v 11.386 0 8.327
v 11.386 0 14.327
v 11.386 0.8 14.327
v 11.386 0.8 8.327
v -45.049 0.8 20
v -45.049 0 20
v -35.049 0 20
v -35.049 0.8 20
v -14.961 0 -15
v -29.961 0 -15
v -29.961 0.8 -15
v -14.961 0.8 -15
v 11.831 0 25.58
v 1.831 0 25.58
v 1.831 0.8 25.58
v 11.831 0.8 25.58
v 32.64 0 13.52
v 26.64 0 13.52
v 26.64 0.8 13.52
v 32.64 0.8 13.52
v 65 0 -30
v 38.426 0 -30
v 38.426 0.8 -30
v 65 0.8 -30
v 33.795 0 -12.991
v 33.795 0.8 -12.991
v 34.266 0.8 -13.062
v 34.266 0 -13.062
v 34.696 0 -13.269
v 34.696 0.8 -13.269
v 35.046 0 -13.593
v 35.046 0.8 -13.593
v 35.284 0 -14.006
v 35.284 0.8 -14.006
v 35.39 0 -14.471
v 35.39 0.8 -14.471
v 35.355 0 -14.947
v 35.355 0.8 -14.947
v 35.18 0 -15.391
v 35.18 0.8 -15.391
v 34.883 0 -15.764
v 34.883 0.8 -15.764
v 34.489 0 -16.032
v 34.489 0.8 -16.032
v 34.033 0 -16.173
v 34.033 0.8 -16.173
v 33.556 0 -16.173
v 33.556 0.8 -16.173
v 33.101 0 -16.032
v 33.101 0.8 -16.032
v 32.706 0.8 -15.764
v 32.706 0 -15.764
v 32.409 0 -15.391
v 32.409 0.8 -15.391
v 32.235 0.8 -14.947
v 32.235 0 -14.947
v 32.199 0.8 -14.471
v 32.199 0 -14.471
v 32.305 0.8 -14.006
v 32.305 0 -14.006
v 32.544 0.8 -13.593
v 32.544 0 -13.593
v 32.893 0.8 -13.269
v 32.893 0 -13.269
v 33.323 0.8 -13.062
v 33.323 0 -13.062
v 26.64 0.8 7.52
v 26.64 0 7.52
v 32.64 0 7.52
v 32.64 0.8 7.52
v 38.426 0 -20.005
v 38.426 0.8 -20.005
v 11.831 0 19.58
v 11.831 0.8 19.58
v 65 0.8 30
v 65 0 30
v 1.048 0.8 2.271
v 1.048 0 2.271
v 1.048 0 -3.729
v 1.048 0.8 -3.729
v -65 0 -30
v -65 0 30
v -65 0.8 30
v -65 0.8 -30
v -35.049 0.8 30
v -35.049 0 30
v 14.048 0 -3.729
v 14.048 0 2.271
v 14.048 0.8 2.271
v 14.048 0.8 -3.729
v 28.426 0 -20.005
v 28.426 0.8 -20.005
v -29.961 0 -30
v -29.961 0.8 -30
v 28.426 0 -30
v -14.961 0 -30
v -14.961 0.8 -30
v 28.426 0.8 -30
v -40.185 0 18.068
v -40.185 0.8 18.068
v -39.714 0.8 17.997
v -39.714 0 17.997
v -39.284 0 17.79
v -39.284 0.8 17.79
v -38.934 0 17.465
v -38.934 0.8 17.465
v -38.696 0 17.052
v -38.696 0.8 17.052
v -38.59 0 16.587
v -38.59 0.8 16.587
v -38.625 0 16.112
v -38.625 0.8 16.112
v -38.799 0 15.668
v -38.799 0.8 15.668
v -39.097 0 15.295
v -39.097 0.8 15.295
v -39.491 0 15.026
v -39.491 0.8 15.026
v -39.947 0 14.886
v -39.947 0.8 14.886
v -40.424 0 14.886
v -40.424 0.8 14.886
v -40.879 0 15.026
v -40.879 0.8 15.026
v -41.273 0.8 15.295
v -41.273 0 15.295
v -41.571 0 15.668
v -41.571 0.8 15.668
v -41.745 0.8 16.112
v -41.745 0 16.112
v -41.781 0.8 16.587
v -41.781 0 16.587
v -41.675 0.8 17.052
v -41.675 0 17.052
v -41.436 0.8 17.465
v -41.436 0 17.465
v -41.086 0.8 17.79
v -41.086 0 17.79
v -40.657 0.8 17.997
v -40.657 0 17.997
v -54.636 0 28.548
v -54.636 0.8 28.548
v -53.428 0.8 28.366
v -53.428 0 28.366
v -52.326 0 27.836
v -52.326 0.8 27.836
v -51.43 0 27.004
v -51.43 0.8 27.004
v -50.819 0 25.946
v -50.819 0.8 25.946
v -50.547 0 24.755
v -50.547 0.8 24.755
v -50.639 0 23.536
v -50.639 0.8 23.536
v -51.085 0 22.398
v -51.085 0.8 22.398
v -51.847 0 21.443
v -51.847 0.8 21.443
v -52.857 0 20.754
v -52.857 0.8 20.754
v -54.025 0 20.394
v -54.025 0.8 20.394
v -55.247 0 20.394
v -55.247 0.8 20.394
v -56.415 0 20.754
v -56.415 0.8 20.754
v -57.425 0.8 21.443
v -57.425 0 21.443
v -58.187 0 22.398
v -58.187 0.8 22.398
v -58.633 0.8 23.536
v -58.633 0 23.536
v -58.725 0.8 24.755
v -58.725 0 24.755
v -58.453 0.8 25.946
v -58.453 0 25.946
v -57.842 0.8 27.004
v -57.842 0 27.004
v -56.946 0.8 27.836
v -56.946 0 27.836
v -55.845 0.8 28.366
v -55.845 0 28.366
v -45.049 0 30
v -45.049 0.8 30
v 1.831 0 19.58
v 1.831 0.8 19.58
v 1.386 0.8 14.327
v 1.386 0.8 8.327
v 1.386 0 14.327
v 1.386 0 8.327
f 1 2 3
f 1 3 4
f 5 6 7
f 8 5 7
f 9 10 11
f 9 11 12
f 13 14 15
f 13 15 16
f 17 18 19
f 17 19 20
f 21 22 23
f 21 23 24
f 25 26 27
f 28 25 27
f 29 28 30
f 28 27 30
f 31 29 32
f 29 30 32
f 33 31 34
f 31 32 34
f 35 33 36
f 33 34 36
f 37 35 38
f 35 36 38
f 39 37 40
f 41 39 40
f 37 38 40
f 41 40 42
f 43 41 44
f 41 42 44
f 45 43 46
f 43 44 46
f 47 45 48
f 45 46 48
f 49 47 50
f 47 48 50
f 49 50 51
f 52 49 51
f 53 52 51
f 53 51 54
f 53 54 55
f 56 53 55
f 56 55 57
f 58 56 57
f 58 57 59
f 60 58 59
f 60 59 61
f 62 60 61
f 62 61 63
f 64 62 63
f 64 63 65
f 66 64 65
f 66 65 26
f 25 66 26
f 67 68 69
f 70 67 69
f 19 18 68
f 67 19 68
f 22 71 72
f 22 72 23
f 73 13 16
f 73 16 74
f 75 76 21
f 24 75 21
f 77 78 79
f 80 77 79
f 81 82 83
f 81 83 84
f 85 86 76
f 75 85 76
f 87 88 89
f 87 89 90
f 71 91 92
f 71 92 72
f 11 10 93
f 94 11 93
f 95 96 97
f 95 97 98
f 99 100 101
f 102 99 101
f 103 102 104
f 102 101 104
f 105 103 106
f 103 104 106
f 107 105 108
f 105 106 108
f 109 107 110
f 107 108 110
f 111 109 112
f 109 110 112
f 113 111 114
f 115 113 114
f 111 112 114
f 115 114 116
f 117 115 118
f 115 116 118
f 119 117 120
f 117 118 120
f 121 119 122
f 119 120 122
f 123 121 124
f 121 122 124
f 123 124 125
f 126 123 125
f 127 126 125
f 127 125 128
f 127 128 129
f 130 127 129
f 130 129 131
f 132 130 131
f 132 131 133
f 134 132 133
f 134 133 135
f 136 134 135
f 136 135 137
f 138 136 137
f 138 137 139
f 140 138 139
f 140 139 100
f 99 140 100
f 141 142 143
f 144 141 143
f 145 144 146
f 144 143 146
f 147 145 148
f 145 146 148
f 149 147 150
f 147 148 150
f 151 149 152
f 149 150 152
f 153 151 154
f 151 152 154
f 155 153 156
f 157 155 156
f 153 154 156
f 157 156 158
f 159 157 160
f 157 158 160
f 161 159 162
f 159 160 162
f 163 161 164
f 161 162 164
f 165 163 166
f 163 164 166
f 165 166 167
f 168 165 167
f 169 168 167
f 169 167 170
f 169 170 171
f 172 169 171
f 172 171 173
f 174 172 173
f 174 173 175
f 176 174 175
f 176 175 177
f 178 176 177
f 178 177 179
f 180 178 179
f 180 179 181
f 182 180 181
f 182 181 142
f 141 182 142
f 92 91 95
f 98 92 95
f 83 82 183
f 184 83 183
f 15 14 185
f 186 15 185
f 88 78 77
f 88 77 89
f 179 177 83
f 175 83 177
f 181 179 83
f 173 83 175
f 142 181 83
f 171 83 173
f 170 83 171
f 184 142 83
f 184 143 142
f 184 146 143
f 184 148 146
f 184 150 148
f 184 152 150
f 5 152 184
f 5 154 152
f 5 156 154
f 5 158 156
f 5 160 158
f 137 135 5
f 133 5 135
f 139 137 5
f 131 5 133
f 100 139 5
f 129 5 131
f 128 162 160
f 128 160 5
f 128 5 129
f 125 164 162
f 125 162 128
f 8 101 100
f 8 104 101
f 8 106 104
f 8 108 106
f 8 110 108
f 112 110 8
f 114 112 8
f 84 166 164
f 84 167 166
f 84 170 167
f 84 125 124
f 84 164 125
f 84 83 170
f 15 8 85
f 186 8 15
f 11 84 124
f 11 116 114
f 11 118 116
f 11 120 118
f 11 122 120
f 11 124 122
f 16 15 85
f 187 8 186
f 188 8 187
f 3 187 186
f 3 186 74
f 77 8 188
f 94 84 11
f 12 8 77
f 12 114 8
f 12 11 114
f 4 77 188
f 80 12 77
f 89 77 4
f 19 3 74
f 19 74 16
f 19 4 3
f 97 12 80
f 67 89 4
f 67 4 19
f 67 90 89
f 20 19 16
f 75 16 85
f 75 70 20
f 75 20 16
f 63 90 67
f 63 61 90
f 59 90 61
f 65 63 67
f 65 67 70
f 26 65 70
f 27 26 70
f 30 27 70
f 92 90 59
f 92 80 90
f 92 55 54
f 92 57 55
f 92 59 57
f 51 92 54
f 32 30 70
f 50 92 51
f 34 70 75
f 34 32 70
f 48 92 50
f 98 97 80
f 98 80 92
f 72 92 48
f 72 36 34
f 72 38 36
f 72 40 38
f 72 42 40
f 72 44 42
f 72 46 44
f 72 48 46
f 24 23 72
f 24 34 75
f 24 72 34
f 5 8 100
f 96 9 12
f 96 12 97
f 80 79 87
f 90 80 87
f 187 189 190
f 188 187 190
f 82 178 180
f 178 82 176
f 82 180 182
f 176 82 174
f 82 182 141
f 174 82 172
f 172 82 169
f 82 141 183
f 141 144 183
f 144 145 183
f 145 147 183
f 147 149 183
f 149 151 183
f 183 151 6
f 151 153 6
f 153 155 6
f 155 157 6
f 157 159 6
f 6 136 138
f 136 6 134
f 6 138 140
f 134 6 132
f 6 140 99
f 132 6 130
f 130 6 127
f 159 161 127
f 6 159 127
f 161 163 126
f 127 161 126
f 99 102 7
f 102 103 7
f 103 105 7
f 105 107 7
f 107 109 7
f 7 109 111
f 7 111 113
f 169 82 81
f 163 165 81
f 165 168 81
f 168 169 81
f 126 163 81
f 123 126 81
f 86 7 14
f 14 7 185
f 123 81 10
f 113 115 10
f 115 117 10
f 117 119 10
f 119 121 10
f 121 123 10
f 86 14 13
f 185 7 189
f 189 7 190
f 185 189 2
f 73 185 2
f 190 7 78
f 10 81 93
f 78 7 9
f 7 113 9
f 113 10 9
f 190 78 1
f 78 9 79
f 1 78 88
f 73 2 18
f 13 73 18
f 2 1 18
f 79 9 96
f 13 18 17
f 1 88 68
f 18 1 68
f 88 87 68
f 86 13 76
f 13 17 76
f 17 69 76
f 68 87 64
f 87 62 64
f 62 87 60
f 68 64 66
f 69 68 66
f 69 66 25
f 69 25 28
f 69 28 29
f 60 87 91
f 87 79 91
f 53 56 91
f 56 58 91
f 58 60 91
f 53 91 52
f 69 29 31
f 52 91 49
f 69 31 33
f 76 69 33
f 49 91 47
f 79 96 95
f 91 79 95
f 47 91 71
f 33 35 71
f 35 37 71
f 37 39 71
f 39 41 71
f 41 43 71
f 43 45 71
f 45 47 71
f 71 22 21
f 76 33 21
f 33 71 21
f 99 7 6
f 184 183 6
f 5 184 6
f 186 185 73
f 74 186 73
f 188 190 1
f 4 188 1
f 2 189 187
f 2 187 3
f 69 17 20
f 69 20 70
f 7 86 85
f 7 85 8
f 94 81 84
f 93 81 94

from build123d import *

# Parameters (mm, degrees)
SKETCH1_W           = 130
SKETCH1_H           = 60
BOSS_EXTRUDE1_DEPTH = 0.8
SKETCH2_W           = 10
SKETCH2_H           = 10
SKETCH2_W_2         = 15
SKETCH2_H_2         = 15
CUT_EXTRUDE5_DEPTH  = 3
SKETCH3_R           = 1.6
SKETCH3_R_2         = 4.1
CUT_EXTRUDE6_DEPTH  = 3
SKETCH4_W           = 13
SKETCH4_H           = 6
SKETCH4_W_2         = 10
SKETCH4_W_3         = 6
CUT_EXTRUDE8_DEPTH  = 3


with BuildPart() as part:
    # Sketch1 → Boss-Extrude1 (new body)
    with BuildSketch(Plane(origin=(0, 0, 0), x_dir=(1, 0, 0), z_dir=(0, 1, 0))):
        Rectangle(SKETCH1_W, SKETCH1_H)
    extrude(amount=BOSS_EXTRUDE1_DEPTH)

    # Sketch2 → Cut-Extrude5 (cut)
    with BuildSketch(Plane(origin=(0, 0, 0), x_dir=(1, 0, 0), z_dir=(0, 1, 0))):
        with Locations((-40.048834012, -25)):
            Rectangle(SKETCH2_W, SKETCH2_H)
        with Locations((33.42564803, 25.004850698)):
            Rectangle(SKETCH2_W, SKETCH2_H)
        with Locations((-22.460867384, 22.5)):
            Rectangle(SKETCH2_W_2, SKETCH2_H_2)
    extrude(amount=CUT_EXTRUDE5_DEPTH, mode=Mode.SUBTRACT)

    # Sketch3 → Cut-Extrude6 (cut)
    with BuildSketch(Plane(origin=(0, 0.8, 0), x_dir=(1, 0, 0), z_dir=(0, 1, 0))):
        with Locations(Location((-40.185122934, -16.467769304, 0), (0, 0, 270))):
            Circle(SKETCH3_R)
        with Locations(Location((33.794766004, 14.590842962, 0), (0, 0, 270))):
            Circle(SKETCH3_R)
        with Locations(Location((-54.63600503, -24.448107178, 0), (0, 0, 270))):
            Circle(SKETCH3_R_2)
    extrude(amount=-CUT_EXTRUDE6_DEPTH, mode=Mode.SUBTRACT)

    # Sketch4 → Cut-Extrude8 (cut)
    with BuildSketch(Plane(origin=(0, 0, 0), x_dir=(1, 0, 0), z_dir=(0, 1, 0))):
        with Locations((7.547565178, 0.728562609)):
            Rectangle(SKETCH4_W, SKETCH4_H)
        with Locations((6.386143638, -11.327057027)):
            Rectangle(SKETCH4_W_2, SKETCH4_H)
        with Locations((6.830928235, -22.580107336)):
            Rectangle(SKETCH4_W_2, SKETCH4_H)
        with Locations((29.640312606, -10.519923454)):
            Rectangle(SKETCH4_W_3, SKETCH4_H)
    extrude(amount=CUT_EXTRUDE8_DEPTH, mode=Mode.SUBTRACT)


solid = part.part
